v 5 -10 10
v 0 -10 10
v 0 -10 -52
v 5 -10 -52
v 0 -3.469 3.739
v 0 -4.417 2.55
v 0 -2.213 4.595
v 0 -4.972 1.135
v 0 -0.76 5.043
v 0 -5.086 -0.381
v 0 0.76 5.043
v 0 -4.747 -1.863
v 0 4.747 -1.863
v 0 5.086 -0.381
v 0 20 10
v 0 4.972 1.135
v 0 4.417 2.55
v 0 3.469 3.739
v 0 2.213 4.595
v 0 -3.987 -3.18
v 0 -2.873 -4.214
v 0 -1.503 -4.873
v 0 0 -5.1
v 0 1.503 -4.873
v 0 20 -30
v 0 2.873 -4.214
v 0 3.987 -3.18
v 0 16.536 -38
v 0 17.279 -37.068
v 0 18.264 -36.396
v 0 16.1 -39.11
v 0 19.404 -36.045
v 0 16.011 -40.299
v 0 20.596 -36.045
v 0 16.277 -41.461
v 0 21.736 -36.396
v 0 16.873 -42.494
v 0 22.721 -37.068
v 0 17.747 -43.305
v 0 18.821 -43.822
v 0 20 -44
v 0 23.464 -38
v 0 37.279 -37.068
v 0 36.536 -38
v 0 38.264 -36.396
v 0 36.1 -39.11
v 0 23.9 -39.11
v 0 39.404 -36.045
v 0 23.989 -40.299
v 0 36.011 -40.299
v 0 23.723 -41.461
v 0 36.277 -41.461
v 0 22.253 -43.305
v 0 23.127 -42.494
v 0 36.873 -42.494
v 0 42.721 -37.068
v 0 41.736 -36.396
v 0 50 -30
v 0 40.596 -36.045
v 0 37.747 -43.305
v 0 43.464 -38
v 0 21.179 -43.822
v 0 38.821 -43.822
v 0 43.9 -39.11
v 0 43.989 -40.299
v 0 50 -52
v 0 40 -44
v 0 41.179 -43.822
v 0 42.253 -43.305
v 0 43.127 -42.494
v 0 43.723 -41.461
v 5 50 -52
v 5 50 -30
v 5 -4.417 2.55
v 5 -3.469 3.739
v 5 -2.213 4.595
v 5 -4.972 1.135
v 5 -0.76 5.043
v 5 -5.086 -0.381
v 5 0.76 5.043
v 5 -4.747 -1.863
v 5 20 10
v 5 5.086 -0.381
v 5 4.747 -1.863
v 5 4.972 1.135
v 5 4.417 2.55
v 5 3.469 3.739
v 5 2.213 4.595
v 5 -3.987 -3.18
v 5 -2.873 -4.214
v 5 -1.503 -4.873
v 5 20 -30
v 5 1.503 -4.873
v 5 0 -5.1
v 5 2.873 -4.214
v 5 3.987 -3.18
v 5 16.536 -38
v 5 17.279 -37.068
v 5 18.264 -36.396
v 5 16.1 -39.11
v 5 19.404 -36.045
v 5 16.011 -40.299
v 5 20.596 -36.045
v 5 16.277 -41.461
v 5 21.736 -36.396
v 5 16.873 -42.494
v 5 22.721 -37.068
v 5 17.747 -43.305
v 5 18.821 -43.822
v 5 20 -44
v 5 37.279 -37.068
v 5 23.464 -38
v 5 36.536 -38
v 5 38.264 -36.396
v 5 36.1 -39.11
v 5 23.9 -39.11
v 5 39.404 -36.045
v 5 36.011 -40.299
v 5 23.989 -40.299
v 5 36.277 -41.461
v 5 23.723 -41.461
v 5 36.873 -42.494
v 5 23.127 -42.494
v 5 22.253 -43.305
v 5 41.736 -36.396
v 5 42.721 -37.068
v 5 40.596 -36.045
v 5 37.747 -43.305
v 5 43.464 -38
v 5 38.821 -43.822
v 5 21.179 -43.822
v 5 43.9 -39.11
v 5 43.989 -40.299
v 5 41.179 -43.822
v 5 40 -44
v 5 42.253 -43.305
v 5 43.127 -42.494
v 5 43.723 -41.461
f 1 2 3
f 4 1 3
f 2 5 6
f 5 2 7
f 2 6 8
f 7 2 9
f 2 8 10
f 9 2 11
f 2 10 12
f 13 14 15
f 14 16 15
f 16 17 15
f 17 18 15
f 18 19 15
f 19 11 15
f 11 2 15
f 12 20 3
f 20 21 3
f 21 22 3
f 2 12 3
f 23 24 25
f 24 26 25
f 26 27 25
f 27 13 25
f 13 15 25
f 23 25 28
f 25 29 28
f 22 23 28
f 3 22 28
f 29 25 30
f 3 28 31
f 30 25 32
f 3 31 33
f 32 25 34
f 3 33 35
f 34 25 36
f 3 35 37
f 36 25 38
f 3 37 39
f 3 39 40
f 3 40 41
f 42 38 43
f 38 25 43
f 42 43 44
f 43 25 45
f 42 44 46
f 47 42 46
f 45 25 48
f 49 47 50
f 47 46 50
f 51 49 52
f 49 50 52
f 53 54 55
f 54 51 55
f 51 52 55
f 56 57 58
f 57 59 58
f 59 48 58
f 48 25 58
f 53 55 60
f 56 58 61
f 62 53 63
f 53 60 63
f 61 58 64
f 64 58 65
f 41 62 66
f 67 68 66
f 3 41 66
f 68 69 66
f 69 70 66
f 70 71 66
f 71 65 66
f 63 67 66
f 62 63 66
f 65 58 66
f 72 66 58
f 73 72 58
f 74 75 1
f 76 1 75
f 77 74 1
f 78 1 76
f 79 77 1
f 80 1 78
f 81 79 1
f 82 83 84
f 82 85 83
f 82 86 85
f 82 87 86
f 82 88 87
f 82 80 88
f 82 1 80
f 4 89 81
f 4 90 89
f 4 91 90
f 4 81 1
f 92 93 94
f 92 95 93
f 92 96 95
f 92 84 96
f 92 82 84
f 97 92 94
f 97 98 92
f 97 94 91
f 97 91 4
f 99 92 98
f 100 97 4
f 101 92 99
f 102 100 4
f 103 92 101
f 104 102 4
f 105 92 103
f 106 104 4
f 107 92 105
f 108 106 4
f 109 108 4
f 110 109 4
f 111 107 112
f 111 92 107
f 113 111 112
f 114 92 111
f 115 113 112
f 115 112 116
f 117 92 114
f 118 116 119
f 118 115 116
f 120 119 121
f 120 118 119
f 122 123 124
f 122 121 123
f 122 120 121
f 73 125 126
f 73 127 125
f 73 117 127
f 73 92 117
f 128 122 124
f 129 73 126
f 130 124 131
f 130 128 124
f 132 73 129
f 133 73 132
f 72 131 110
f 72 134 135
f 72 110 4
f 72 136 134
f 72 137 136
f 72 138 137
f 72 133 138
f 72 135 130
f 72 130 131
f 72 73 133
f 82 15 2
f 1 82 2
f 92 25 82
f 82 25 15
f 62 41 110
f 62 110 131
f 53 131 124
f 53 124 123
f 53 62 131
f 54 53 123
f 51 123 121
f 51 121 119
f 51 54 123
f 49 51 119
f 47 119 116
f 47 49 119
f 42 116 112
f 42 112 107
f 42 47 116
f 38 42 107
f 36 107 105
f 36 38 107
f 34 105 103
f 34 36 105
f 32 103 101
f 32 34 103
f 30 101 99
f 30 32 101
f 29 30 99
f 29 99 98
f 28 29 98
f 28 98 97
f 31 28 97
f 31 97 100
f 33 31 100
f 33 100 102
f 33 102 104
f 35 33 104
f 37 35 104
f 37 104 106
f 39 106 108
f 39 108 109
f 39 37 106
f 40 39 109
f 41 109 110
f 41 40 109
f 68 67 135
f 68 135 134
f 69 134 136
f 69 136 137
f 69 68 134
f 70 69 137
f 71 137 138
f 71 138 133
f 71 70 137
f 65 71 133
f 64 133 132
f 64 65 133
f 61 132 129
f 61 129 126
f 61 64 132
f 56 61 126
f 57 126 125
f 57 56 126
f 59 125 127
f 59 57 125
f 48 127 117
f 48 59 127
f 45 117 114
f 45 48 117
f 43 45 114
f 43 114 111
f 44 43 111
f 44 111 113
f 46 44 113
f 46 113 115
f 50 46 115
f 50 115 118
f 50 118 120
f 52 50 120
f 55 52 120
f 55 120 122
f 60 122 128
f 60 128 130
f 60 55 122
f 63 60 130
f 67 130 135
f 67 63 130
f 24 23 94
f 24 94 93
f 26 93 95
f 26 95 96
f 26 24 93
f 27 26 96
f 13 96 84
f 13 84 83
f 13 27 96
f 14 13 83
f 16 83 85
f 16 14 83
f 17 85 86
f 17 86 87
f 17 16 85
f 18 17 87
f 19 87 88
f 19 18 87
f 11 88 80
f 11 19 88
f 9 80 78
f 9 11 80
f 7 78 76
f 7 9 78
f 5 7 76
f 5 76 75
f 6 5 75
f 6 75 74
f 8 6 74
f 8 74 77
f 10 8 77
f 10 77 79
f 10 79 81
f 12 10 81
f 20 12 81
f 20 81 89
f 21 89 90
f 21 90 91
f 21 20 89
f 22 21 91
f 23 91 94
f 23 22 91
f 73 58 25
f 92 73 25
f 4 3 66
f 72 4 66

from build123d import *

# Parameters (mm, degrees)
SKETCH2_R           = 4
SKETCH2_R_2         = 5.1
BOSS_EXTRUDE3_DEPTH = 5


with BuildPart() as part:
    # Sketch2 → Boss-Extrude3 (new body)
    with BuildSketch(Plane(origin=(0, 0, 0), x_dir=(0, 0, -1), z_dir=(1, 0, 0))):
        Polygon((52, -10), (52, 50), (30, 50), (30, 20), (-10, 20), (-10, -10), align=None)
        with Locations((40, 40)):
            Circle(SKETCH2_R, mode=Mode.SUBTRACT)
        with Locations((40, 20)):
            Circle(SKETCH2_R, mode=Mode.SUBTRACT)
        Circle(SKETCH2_R_2, mode=Mode.SUBTRACT)
    extrude(amount=BOSS_EXTRUDE3_DEPTH)


solid = part.part
